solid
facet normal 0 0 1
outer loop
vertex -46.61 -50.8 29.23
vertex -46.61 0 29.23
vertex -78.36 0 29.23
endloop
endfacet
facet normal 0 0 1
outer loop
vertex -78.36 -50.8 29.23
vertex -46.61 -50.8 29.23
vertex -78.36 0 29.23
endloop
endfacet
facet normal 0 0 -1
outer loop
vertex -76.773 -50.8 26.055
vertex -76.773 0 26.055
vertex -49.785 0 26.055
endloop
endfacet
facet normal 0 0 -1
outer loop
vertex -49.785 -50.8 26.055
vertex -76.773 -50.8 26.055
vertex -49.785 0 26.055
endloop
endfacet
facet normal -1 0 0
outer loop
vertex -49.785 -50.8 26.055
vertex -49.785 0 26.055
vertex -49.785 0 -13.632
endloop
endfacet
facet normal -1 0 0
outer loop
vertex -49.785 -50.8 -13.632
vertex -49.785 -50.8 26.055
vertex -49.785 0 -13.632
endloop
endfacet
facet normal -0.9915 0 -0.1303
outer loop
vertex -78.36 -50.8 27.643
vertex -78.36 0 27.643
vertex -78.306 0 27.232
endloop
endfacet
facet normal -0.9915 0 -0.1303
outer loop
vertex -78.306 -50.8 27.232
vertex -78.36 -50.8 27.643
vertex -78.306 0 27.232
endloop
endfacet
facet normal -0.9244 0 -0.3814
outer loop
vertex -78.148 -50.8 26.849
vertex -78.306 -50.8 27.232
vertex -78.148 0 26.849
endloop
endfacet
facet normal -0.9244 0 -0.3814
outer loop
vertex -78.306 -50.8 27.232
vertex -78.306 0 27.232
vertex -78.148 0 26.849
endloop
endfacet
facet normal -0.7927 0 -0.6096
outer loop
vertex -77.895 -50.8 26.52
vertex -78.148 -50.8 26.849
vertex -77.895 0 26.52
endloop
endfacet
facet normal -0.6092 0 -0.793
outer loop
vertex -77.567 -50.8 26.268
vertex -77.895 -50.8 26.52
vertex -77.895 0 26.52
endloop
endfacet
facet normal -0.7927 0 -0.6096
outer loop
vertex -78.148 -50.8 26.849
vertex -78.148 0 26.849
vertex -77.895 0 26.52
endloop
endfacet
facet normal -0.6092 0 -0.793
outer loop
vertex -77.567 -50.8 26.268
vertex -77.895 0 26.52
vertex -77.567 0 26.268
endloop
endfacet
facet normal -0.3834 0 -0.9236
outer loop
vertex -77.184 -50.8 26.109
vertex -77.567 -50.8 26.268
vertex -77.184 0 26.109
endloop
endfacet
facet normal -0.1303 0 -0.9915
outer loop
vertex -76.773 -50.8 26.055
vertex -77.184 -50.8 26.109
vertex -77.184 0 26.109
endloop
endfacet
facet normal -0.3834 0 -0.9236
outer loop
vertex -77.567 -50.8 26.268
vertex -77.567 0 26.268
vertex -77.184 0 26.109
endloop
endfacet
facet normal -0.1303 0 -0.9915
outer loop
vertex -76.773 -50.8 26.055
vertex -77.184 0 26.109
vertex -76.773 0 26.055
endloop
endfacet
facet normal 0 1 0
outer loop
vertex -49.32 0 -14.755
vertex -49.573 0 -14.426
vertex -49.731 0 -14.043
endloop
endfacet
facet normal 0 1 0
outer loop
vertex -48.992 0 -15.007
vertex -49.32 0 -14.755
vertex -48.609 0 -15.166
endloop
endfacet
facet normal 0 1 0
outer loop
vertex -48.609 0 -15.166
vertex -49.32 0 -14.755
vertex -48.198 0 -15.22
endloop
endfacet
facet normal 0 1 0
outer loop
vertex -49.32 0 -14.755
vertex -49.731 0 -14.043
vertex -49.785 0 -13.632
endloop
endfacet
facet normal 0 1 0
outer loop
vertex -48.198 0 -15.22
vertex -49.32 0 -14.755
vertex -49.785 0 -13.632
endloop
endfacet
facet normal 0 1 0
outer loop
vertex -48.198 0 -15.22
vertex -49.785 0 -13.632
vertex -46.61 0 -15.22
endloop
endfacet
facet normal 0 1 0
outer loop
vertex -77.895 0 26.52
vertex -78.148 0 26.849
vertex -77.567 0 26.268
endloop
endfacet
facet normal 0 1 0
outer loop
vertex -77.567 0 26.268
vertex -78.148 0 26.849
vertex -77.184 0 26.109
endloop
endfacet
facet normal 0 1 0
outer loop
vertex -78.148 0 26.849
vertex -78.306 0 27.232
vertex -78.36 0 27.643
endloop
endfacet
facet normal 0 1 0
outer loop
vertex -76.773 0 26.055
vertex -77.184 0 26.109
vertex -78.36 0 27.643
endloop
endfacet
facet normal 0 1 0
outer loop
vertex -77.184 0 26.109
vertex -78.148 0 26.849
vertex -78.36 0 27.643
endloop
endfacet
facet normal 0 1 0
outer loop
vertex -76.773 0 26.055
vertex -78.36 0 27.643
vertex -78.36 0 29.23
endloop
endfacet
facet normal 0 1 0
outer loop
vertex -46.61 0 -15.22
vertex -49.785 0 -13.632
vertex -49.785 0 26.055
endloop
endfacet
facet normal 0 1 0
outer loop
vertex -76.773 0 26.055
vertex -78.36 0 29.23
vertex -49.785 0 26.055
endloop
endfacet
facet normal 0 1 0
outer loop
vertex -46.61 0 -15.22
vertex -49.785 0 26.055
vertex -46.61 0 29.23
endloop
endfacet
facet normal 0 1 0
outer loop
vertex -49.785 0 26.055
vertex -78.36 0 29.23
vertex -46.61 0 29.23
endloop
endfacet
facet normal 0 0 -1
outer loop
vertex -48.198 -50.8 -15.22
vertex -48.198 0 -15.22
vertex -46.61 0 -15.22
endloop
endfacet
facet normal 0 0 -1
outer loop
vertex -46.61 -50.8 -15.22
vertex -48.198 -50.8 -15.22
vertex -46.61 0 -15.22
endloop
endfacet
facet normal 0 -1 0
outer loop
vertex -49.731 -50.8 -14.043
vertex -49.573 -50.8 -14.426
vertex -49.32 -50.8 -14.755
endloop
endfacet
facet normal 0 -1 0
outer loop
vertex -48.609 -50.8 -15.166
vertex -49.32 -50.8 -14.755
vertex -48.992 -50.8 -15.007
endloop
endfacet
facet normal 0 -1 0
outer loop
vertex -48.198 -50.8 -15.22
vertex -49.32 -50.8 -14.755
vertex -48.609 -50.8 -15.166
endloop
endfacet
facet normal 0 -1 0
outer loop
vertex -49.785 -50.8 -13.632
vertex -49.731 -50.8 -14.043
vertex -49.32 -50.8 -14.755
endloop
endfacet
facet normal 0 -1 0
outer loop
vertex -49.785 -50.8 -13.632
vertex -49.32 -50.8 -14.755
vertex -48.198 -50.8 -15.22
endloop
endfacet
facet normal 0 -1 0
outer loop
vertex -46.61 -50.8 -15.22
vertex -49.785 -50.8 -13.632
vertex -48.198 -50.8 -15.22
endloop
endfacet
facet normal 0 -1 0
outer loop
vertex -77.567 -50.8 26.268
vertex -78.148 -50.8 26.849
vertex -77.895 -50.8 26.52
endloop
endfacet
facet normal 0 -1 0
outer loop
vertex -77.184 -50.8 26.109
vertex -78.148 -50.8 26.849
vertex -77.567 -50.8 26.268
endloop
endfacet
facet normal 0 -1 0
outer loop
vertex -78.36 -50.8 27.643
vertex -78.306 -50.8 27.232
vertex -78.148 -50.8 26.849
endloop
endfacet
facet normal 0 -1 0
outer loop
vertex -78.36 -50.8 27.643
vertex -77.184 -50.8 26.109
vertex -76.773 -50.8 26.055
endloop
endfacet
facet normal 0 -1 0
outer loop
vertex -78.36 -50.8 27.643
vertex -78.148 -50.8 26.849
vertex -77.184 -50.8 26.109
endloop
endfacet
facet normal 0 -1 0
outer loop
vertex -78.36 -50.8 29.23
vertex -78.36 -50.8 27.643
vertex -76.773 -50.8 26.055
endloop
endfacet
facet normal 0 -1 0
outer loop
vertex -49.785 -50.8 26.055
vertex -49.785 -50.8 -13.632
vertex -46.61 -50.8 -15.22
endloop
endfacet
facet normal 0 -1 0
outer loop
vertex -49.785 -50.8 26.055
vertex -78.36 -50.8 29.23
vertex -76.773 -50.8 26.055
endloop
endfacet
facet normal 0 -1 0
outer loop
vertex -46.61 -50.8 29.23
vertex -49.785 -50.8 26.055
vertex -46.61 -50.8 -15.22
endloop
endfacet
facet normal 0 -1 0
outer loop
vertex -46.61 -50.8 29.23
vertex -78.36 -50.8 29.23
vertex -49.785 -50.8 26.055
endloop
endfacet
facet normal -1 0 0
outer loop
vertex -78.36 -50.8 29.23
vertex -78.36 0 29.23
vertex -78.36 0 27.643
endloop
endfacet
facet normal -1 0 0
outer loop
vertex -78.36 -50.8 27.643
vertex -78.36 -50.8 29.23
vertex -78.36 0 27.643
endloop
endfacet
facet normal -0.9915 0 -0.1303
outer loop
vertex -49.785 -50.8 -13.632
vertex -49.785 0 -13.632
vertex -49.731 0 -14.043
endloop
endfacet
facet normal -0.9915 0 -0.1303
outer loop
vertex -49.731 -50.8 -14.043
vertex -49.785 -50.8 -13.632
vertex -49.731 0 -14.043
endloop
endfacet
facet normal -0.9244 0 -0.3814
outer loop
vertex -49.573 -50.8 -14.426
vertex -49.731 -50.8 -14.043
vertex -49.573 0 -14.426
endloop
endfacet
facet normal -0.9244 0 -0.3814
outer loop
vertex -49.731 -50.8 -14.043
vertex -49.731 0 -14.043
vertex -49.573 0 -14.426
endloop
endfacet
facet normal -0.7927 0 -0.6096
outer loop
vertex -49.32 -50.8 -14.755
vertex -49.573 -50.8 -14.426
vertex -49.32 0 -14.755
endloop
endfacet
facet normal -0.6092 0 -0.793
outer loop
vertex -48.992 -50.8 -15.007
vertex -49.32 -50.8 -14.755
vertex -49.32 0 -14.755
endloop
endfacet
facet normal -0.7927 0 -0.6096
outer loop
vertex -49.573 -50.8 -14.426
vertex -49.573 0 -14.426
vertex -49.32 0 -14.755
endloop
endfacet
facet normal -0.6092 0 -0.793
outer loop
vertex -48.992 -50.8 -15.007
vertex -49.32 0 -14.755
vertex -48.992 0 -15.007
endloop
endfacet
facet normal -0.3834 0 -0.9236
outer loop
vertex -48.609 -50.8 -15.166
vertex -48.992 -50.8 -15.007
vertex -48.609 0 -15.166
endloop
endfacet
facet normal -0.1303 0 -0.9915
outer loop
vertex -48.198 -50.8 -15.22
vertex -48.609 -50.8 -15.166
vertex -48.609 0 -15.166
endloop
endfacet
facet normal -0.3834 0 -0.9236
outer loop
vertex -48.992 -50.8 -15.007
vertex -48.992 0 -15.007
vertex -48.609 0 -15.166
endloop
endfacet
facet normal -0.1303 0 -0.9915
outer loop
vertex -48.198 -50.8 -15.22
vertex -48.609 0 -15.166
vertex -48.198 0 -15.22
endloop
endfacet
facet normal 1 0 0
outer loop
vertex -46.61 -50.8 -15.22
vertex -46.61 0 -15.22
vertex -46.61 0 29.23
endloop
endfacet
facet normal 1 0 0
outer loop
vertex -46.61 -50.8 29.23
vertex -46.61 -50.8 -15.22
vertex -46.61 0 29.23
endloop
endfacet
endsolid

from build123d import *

# Parameters (mm, degrees)
F1_DEPTH = 50.8


with BuildPart() as f1:
    # F0 (on Front) → F1 (new body)
    with BuildSketch(Plane.XZ):
        with BuildLine():
            Line((-46.61043, 29.230101), (-78.36043, 29.230101))
            Line((-78.36043, 29.230101), (-78.36043, 27.642601))
            ThreePointArc((-78.36043, 27.642601), (-77.895462, 26.520069), (-76.77293, 26.055101))
            Line((-76.77293, 26.055101), (-49.78543, 26.055101))
            Line((-49.78543, 26.055101), (-49.78543, -13.632399))
            ThreePointArc((-49.78543, -13.632399), (-49.320462, -14.754931), (-48.19793, -15.219899))
            Line((-48.19793, -15.219899), (-46.61043, -15.219899))
            Line((-46.61043, -15.219899), (-46.61043, 29.230101))
        make_face()
    extrude(amount=F1_DEPTH)


solid = f1.part
